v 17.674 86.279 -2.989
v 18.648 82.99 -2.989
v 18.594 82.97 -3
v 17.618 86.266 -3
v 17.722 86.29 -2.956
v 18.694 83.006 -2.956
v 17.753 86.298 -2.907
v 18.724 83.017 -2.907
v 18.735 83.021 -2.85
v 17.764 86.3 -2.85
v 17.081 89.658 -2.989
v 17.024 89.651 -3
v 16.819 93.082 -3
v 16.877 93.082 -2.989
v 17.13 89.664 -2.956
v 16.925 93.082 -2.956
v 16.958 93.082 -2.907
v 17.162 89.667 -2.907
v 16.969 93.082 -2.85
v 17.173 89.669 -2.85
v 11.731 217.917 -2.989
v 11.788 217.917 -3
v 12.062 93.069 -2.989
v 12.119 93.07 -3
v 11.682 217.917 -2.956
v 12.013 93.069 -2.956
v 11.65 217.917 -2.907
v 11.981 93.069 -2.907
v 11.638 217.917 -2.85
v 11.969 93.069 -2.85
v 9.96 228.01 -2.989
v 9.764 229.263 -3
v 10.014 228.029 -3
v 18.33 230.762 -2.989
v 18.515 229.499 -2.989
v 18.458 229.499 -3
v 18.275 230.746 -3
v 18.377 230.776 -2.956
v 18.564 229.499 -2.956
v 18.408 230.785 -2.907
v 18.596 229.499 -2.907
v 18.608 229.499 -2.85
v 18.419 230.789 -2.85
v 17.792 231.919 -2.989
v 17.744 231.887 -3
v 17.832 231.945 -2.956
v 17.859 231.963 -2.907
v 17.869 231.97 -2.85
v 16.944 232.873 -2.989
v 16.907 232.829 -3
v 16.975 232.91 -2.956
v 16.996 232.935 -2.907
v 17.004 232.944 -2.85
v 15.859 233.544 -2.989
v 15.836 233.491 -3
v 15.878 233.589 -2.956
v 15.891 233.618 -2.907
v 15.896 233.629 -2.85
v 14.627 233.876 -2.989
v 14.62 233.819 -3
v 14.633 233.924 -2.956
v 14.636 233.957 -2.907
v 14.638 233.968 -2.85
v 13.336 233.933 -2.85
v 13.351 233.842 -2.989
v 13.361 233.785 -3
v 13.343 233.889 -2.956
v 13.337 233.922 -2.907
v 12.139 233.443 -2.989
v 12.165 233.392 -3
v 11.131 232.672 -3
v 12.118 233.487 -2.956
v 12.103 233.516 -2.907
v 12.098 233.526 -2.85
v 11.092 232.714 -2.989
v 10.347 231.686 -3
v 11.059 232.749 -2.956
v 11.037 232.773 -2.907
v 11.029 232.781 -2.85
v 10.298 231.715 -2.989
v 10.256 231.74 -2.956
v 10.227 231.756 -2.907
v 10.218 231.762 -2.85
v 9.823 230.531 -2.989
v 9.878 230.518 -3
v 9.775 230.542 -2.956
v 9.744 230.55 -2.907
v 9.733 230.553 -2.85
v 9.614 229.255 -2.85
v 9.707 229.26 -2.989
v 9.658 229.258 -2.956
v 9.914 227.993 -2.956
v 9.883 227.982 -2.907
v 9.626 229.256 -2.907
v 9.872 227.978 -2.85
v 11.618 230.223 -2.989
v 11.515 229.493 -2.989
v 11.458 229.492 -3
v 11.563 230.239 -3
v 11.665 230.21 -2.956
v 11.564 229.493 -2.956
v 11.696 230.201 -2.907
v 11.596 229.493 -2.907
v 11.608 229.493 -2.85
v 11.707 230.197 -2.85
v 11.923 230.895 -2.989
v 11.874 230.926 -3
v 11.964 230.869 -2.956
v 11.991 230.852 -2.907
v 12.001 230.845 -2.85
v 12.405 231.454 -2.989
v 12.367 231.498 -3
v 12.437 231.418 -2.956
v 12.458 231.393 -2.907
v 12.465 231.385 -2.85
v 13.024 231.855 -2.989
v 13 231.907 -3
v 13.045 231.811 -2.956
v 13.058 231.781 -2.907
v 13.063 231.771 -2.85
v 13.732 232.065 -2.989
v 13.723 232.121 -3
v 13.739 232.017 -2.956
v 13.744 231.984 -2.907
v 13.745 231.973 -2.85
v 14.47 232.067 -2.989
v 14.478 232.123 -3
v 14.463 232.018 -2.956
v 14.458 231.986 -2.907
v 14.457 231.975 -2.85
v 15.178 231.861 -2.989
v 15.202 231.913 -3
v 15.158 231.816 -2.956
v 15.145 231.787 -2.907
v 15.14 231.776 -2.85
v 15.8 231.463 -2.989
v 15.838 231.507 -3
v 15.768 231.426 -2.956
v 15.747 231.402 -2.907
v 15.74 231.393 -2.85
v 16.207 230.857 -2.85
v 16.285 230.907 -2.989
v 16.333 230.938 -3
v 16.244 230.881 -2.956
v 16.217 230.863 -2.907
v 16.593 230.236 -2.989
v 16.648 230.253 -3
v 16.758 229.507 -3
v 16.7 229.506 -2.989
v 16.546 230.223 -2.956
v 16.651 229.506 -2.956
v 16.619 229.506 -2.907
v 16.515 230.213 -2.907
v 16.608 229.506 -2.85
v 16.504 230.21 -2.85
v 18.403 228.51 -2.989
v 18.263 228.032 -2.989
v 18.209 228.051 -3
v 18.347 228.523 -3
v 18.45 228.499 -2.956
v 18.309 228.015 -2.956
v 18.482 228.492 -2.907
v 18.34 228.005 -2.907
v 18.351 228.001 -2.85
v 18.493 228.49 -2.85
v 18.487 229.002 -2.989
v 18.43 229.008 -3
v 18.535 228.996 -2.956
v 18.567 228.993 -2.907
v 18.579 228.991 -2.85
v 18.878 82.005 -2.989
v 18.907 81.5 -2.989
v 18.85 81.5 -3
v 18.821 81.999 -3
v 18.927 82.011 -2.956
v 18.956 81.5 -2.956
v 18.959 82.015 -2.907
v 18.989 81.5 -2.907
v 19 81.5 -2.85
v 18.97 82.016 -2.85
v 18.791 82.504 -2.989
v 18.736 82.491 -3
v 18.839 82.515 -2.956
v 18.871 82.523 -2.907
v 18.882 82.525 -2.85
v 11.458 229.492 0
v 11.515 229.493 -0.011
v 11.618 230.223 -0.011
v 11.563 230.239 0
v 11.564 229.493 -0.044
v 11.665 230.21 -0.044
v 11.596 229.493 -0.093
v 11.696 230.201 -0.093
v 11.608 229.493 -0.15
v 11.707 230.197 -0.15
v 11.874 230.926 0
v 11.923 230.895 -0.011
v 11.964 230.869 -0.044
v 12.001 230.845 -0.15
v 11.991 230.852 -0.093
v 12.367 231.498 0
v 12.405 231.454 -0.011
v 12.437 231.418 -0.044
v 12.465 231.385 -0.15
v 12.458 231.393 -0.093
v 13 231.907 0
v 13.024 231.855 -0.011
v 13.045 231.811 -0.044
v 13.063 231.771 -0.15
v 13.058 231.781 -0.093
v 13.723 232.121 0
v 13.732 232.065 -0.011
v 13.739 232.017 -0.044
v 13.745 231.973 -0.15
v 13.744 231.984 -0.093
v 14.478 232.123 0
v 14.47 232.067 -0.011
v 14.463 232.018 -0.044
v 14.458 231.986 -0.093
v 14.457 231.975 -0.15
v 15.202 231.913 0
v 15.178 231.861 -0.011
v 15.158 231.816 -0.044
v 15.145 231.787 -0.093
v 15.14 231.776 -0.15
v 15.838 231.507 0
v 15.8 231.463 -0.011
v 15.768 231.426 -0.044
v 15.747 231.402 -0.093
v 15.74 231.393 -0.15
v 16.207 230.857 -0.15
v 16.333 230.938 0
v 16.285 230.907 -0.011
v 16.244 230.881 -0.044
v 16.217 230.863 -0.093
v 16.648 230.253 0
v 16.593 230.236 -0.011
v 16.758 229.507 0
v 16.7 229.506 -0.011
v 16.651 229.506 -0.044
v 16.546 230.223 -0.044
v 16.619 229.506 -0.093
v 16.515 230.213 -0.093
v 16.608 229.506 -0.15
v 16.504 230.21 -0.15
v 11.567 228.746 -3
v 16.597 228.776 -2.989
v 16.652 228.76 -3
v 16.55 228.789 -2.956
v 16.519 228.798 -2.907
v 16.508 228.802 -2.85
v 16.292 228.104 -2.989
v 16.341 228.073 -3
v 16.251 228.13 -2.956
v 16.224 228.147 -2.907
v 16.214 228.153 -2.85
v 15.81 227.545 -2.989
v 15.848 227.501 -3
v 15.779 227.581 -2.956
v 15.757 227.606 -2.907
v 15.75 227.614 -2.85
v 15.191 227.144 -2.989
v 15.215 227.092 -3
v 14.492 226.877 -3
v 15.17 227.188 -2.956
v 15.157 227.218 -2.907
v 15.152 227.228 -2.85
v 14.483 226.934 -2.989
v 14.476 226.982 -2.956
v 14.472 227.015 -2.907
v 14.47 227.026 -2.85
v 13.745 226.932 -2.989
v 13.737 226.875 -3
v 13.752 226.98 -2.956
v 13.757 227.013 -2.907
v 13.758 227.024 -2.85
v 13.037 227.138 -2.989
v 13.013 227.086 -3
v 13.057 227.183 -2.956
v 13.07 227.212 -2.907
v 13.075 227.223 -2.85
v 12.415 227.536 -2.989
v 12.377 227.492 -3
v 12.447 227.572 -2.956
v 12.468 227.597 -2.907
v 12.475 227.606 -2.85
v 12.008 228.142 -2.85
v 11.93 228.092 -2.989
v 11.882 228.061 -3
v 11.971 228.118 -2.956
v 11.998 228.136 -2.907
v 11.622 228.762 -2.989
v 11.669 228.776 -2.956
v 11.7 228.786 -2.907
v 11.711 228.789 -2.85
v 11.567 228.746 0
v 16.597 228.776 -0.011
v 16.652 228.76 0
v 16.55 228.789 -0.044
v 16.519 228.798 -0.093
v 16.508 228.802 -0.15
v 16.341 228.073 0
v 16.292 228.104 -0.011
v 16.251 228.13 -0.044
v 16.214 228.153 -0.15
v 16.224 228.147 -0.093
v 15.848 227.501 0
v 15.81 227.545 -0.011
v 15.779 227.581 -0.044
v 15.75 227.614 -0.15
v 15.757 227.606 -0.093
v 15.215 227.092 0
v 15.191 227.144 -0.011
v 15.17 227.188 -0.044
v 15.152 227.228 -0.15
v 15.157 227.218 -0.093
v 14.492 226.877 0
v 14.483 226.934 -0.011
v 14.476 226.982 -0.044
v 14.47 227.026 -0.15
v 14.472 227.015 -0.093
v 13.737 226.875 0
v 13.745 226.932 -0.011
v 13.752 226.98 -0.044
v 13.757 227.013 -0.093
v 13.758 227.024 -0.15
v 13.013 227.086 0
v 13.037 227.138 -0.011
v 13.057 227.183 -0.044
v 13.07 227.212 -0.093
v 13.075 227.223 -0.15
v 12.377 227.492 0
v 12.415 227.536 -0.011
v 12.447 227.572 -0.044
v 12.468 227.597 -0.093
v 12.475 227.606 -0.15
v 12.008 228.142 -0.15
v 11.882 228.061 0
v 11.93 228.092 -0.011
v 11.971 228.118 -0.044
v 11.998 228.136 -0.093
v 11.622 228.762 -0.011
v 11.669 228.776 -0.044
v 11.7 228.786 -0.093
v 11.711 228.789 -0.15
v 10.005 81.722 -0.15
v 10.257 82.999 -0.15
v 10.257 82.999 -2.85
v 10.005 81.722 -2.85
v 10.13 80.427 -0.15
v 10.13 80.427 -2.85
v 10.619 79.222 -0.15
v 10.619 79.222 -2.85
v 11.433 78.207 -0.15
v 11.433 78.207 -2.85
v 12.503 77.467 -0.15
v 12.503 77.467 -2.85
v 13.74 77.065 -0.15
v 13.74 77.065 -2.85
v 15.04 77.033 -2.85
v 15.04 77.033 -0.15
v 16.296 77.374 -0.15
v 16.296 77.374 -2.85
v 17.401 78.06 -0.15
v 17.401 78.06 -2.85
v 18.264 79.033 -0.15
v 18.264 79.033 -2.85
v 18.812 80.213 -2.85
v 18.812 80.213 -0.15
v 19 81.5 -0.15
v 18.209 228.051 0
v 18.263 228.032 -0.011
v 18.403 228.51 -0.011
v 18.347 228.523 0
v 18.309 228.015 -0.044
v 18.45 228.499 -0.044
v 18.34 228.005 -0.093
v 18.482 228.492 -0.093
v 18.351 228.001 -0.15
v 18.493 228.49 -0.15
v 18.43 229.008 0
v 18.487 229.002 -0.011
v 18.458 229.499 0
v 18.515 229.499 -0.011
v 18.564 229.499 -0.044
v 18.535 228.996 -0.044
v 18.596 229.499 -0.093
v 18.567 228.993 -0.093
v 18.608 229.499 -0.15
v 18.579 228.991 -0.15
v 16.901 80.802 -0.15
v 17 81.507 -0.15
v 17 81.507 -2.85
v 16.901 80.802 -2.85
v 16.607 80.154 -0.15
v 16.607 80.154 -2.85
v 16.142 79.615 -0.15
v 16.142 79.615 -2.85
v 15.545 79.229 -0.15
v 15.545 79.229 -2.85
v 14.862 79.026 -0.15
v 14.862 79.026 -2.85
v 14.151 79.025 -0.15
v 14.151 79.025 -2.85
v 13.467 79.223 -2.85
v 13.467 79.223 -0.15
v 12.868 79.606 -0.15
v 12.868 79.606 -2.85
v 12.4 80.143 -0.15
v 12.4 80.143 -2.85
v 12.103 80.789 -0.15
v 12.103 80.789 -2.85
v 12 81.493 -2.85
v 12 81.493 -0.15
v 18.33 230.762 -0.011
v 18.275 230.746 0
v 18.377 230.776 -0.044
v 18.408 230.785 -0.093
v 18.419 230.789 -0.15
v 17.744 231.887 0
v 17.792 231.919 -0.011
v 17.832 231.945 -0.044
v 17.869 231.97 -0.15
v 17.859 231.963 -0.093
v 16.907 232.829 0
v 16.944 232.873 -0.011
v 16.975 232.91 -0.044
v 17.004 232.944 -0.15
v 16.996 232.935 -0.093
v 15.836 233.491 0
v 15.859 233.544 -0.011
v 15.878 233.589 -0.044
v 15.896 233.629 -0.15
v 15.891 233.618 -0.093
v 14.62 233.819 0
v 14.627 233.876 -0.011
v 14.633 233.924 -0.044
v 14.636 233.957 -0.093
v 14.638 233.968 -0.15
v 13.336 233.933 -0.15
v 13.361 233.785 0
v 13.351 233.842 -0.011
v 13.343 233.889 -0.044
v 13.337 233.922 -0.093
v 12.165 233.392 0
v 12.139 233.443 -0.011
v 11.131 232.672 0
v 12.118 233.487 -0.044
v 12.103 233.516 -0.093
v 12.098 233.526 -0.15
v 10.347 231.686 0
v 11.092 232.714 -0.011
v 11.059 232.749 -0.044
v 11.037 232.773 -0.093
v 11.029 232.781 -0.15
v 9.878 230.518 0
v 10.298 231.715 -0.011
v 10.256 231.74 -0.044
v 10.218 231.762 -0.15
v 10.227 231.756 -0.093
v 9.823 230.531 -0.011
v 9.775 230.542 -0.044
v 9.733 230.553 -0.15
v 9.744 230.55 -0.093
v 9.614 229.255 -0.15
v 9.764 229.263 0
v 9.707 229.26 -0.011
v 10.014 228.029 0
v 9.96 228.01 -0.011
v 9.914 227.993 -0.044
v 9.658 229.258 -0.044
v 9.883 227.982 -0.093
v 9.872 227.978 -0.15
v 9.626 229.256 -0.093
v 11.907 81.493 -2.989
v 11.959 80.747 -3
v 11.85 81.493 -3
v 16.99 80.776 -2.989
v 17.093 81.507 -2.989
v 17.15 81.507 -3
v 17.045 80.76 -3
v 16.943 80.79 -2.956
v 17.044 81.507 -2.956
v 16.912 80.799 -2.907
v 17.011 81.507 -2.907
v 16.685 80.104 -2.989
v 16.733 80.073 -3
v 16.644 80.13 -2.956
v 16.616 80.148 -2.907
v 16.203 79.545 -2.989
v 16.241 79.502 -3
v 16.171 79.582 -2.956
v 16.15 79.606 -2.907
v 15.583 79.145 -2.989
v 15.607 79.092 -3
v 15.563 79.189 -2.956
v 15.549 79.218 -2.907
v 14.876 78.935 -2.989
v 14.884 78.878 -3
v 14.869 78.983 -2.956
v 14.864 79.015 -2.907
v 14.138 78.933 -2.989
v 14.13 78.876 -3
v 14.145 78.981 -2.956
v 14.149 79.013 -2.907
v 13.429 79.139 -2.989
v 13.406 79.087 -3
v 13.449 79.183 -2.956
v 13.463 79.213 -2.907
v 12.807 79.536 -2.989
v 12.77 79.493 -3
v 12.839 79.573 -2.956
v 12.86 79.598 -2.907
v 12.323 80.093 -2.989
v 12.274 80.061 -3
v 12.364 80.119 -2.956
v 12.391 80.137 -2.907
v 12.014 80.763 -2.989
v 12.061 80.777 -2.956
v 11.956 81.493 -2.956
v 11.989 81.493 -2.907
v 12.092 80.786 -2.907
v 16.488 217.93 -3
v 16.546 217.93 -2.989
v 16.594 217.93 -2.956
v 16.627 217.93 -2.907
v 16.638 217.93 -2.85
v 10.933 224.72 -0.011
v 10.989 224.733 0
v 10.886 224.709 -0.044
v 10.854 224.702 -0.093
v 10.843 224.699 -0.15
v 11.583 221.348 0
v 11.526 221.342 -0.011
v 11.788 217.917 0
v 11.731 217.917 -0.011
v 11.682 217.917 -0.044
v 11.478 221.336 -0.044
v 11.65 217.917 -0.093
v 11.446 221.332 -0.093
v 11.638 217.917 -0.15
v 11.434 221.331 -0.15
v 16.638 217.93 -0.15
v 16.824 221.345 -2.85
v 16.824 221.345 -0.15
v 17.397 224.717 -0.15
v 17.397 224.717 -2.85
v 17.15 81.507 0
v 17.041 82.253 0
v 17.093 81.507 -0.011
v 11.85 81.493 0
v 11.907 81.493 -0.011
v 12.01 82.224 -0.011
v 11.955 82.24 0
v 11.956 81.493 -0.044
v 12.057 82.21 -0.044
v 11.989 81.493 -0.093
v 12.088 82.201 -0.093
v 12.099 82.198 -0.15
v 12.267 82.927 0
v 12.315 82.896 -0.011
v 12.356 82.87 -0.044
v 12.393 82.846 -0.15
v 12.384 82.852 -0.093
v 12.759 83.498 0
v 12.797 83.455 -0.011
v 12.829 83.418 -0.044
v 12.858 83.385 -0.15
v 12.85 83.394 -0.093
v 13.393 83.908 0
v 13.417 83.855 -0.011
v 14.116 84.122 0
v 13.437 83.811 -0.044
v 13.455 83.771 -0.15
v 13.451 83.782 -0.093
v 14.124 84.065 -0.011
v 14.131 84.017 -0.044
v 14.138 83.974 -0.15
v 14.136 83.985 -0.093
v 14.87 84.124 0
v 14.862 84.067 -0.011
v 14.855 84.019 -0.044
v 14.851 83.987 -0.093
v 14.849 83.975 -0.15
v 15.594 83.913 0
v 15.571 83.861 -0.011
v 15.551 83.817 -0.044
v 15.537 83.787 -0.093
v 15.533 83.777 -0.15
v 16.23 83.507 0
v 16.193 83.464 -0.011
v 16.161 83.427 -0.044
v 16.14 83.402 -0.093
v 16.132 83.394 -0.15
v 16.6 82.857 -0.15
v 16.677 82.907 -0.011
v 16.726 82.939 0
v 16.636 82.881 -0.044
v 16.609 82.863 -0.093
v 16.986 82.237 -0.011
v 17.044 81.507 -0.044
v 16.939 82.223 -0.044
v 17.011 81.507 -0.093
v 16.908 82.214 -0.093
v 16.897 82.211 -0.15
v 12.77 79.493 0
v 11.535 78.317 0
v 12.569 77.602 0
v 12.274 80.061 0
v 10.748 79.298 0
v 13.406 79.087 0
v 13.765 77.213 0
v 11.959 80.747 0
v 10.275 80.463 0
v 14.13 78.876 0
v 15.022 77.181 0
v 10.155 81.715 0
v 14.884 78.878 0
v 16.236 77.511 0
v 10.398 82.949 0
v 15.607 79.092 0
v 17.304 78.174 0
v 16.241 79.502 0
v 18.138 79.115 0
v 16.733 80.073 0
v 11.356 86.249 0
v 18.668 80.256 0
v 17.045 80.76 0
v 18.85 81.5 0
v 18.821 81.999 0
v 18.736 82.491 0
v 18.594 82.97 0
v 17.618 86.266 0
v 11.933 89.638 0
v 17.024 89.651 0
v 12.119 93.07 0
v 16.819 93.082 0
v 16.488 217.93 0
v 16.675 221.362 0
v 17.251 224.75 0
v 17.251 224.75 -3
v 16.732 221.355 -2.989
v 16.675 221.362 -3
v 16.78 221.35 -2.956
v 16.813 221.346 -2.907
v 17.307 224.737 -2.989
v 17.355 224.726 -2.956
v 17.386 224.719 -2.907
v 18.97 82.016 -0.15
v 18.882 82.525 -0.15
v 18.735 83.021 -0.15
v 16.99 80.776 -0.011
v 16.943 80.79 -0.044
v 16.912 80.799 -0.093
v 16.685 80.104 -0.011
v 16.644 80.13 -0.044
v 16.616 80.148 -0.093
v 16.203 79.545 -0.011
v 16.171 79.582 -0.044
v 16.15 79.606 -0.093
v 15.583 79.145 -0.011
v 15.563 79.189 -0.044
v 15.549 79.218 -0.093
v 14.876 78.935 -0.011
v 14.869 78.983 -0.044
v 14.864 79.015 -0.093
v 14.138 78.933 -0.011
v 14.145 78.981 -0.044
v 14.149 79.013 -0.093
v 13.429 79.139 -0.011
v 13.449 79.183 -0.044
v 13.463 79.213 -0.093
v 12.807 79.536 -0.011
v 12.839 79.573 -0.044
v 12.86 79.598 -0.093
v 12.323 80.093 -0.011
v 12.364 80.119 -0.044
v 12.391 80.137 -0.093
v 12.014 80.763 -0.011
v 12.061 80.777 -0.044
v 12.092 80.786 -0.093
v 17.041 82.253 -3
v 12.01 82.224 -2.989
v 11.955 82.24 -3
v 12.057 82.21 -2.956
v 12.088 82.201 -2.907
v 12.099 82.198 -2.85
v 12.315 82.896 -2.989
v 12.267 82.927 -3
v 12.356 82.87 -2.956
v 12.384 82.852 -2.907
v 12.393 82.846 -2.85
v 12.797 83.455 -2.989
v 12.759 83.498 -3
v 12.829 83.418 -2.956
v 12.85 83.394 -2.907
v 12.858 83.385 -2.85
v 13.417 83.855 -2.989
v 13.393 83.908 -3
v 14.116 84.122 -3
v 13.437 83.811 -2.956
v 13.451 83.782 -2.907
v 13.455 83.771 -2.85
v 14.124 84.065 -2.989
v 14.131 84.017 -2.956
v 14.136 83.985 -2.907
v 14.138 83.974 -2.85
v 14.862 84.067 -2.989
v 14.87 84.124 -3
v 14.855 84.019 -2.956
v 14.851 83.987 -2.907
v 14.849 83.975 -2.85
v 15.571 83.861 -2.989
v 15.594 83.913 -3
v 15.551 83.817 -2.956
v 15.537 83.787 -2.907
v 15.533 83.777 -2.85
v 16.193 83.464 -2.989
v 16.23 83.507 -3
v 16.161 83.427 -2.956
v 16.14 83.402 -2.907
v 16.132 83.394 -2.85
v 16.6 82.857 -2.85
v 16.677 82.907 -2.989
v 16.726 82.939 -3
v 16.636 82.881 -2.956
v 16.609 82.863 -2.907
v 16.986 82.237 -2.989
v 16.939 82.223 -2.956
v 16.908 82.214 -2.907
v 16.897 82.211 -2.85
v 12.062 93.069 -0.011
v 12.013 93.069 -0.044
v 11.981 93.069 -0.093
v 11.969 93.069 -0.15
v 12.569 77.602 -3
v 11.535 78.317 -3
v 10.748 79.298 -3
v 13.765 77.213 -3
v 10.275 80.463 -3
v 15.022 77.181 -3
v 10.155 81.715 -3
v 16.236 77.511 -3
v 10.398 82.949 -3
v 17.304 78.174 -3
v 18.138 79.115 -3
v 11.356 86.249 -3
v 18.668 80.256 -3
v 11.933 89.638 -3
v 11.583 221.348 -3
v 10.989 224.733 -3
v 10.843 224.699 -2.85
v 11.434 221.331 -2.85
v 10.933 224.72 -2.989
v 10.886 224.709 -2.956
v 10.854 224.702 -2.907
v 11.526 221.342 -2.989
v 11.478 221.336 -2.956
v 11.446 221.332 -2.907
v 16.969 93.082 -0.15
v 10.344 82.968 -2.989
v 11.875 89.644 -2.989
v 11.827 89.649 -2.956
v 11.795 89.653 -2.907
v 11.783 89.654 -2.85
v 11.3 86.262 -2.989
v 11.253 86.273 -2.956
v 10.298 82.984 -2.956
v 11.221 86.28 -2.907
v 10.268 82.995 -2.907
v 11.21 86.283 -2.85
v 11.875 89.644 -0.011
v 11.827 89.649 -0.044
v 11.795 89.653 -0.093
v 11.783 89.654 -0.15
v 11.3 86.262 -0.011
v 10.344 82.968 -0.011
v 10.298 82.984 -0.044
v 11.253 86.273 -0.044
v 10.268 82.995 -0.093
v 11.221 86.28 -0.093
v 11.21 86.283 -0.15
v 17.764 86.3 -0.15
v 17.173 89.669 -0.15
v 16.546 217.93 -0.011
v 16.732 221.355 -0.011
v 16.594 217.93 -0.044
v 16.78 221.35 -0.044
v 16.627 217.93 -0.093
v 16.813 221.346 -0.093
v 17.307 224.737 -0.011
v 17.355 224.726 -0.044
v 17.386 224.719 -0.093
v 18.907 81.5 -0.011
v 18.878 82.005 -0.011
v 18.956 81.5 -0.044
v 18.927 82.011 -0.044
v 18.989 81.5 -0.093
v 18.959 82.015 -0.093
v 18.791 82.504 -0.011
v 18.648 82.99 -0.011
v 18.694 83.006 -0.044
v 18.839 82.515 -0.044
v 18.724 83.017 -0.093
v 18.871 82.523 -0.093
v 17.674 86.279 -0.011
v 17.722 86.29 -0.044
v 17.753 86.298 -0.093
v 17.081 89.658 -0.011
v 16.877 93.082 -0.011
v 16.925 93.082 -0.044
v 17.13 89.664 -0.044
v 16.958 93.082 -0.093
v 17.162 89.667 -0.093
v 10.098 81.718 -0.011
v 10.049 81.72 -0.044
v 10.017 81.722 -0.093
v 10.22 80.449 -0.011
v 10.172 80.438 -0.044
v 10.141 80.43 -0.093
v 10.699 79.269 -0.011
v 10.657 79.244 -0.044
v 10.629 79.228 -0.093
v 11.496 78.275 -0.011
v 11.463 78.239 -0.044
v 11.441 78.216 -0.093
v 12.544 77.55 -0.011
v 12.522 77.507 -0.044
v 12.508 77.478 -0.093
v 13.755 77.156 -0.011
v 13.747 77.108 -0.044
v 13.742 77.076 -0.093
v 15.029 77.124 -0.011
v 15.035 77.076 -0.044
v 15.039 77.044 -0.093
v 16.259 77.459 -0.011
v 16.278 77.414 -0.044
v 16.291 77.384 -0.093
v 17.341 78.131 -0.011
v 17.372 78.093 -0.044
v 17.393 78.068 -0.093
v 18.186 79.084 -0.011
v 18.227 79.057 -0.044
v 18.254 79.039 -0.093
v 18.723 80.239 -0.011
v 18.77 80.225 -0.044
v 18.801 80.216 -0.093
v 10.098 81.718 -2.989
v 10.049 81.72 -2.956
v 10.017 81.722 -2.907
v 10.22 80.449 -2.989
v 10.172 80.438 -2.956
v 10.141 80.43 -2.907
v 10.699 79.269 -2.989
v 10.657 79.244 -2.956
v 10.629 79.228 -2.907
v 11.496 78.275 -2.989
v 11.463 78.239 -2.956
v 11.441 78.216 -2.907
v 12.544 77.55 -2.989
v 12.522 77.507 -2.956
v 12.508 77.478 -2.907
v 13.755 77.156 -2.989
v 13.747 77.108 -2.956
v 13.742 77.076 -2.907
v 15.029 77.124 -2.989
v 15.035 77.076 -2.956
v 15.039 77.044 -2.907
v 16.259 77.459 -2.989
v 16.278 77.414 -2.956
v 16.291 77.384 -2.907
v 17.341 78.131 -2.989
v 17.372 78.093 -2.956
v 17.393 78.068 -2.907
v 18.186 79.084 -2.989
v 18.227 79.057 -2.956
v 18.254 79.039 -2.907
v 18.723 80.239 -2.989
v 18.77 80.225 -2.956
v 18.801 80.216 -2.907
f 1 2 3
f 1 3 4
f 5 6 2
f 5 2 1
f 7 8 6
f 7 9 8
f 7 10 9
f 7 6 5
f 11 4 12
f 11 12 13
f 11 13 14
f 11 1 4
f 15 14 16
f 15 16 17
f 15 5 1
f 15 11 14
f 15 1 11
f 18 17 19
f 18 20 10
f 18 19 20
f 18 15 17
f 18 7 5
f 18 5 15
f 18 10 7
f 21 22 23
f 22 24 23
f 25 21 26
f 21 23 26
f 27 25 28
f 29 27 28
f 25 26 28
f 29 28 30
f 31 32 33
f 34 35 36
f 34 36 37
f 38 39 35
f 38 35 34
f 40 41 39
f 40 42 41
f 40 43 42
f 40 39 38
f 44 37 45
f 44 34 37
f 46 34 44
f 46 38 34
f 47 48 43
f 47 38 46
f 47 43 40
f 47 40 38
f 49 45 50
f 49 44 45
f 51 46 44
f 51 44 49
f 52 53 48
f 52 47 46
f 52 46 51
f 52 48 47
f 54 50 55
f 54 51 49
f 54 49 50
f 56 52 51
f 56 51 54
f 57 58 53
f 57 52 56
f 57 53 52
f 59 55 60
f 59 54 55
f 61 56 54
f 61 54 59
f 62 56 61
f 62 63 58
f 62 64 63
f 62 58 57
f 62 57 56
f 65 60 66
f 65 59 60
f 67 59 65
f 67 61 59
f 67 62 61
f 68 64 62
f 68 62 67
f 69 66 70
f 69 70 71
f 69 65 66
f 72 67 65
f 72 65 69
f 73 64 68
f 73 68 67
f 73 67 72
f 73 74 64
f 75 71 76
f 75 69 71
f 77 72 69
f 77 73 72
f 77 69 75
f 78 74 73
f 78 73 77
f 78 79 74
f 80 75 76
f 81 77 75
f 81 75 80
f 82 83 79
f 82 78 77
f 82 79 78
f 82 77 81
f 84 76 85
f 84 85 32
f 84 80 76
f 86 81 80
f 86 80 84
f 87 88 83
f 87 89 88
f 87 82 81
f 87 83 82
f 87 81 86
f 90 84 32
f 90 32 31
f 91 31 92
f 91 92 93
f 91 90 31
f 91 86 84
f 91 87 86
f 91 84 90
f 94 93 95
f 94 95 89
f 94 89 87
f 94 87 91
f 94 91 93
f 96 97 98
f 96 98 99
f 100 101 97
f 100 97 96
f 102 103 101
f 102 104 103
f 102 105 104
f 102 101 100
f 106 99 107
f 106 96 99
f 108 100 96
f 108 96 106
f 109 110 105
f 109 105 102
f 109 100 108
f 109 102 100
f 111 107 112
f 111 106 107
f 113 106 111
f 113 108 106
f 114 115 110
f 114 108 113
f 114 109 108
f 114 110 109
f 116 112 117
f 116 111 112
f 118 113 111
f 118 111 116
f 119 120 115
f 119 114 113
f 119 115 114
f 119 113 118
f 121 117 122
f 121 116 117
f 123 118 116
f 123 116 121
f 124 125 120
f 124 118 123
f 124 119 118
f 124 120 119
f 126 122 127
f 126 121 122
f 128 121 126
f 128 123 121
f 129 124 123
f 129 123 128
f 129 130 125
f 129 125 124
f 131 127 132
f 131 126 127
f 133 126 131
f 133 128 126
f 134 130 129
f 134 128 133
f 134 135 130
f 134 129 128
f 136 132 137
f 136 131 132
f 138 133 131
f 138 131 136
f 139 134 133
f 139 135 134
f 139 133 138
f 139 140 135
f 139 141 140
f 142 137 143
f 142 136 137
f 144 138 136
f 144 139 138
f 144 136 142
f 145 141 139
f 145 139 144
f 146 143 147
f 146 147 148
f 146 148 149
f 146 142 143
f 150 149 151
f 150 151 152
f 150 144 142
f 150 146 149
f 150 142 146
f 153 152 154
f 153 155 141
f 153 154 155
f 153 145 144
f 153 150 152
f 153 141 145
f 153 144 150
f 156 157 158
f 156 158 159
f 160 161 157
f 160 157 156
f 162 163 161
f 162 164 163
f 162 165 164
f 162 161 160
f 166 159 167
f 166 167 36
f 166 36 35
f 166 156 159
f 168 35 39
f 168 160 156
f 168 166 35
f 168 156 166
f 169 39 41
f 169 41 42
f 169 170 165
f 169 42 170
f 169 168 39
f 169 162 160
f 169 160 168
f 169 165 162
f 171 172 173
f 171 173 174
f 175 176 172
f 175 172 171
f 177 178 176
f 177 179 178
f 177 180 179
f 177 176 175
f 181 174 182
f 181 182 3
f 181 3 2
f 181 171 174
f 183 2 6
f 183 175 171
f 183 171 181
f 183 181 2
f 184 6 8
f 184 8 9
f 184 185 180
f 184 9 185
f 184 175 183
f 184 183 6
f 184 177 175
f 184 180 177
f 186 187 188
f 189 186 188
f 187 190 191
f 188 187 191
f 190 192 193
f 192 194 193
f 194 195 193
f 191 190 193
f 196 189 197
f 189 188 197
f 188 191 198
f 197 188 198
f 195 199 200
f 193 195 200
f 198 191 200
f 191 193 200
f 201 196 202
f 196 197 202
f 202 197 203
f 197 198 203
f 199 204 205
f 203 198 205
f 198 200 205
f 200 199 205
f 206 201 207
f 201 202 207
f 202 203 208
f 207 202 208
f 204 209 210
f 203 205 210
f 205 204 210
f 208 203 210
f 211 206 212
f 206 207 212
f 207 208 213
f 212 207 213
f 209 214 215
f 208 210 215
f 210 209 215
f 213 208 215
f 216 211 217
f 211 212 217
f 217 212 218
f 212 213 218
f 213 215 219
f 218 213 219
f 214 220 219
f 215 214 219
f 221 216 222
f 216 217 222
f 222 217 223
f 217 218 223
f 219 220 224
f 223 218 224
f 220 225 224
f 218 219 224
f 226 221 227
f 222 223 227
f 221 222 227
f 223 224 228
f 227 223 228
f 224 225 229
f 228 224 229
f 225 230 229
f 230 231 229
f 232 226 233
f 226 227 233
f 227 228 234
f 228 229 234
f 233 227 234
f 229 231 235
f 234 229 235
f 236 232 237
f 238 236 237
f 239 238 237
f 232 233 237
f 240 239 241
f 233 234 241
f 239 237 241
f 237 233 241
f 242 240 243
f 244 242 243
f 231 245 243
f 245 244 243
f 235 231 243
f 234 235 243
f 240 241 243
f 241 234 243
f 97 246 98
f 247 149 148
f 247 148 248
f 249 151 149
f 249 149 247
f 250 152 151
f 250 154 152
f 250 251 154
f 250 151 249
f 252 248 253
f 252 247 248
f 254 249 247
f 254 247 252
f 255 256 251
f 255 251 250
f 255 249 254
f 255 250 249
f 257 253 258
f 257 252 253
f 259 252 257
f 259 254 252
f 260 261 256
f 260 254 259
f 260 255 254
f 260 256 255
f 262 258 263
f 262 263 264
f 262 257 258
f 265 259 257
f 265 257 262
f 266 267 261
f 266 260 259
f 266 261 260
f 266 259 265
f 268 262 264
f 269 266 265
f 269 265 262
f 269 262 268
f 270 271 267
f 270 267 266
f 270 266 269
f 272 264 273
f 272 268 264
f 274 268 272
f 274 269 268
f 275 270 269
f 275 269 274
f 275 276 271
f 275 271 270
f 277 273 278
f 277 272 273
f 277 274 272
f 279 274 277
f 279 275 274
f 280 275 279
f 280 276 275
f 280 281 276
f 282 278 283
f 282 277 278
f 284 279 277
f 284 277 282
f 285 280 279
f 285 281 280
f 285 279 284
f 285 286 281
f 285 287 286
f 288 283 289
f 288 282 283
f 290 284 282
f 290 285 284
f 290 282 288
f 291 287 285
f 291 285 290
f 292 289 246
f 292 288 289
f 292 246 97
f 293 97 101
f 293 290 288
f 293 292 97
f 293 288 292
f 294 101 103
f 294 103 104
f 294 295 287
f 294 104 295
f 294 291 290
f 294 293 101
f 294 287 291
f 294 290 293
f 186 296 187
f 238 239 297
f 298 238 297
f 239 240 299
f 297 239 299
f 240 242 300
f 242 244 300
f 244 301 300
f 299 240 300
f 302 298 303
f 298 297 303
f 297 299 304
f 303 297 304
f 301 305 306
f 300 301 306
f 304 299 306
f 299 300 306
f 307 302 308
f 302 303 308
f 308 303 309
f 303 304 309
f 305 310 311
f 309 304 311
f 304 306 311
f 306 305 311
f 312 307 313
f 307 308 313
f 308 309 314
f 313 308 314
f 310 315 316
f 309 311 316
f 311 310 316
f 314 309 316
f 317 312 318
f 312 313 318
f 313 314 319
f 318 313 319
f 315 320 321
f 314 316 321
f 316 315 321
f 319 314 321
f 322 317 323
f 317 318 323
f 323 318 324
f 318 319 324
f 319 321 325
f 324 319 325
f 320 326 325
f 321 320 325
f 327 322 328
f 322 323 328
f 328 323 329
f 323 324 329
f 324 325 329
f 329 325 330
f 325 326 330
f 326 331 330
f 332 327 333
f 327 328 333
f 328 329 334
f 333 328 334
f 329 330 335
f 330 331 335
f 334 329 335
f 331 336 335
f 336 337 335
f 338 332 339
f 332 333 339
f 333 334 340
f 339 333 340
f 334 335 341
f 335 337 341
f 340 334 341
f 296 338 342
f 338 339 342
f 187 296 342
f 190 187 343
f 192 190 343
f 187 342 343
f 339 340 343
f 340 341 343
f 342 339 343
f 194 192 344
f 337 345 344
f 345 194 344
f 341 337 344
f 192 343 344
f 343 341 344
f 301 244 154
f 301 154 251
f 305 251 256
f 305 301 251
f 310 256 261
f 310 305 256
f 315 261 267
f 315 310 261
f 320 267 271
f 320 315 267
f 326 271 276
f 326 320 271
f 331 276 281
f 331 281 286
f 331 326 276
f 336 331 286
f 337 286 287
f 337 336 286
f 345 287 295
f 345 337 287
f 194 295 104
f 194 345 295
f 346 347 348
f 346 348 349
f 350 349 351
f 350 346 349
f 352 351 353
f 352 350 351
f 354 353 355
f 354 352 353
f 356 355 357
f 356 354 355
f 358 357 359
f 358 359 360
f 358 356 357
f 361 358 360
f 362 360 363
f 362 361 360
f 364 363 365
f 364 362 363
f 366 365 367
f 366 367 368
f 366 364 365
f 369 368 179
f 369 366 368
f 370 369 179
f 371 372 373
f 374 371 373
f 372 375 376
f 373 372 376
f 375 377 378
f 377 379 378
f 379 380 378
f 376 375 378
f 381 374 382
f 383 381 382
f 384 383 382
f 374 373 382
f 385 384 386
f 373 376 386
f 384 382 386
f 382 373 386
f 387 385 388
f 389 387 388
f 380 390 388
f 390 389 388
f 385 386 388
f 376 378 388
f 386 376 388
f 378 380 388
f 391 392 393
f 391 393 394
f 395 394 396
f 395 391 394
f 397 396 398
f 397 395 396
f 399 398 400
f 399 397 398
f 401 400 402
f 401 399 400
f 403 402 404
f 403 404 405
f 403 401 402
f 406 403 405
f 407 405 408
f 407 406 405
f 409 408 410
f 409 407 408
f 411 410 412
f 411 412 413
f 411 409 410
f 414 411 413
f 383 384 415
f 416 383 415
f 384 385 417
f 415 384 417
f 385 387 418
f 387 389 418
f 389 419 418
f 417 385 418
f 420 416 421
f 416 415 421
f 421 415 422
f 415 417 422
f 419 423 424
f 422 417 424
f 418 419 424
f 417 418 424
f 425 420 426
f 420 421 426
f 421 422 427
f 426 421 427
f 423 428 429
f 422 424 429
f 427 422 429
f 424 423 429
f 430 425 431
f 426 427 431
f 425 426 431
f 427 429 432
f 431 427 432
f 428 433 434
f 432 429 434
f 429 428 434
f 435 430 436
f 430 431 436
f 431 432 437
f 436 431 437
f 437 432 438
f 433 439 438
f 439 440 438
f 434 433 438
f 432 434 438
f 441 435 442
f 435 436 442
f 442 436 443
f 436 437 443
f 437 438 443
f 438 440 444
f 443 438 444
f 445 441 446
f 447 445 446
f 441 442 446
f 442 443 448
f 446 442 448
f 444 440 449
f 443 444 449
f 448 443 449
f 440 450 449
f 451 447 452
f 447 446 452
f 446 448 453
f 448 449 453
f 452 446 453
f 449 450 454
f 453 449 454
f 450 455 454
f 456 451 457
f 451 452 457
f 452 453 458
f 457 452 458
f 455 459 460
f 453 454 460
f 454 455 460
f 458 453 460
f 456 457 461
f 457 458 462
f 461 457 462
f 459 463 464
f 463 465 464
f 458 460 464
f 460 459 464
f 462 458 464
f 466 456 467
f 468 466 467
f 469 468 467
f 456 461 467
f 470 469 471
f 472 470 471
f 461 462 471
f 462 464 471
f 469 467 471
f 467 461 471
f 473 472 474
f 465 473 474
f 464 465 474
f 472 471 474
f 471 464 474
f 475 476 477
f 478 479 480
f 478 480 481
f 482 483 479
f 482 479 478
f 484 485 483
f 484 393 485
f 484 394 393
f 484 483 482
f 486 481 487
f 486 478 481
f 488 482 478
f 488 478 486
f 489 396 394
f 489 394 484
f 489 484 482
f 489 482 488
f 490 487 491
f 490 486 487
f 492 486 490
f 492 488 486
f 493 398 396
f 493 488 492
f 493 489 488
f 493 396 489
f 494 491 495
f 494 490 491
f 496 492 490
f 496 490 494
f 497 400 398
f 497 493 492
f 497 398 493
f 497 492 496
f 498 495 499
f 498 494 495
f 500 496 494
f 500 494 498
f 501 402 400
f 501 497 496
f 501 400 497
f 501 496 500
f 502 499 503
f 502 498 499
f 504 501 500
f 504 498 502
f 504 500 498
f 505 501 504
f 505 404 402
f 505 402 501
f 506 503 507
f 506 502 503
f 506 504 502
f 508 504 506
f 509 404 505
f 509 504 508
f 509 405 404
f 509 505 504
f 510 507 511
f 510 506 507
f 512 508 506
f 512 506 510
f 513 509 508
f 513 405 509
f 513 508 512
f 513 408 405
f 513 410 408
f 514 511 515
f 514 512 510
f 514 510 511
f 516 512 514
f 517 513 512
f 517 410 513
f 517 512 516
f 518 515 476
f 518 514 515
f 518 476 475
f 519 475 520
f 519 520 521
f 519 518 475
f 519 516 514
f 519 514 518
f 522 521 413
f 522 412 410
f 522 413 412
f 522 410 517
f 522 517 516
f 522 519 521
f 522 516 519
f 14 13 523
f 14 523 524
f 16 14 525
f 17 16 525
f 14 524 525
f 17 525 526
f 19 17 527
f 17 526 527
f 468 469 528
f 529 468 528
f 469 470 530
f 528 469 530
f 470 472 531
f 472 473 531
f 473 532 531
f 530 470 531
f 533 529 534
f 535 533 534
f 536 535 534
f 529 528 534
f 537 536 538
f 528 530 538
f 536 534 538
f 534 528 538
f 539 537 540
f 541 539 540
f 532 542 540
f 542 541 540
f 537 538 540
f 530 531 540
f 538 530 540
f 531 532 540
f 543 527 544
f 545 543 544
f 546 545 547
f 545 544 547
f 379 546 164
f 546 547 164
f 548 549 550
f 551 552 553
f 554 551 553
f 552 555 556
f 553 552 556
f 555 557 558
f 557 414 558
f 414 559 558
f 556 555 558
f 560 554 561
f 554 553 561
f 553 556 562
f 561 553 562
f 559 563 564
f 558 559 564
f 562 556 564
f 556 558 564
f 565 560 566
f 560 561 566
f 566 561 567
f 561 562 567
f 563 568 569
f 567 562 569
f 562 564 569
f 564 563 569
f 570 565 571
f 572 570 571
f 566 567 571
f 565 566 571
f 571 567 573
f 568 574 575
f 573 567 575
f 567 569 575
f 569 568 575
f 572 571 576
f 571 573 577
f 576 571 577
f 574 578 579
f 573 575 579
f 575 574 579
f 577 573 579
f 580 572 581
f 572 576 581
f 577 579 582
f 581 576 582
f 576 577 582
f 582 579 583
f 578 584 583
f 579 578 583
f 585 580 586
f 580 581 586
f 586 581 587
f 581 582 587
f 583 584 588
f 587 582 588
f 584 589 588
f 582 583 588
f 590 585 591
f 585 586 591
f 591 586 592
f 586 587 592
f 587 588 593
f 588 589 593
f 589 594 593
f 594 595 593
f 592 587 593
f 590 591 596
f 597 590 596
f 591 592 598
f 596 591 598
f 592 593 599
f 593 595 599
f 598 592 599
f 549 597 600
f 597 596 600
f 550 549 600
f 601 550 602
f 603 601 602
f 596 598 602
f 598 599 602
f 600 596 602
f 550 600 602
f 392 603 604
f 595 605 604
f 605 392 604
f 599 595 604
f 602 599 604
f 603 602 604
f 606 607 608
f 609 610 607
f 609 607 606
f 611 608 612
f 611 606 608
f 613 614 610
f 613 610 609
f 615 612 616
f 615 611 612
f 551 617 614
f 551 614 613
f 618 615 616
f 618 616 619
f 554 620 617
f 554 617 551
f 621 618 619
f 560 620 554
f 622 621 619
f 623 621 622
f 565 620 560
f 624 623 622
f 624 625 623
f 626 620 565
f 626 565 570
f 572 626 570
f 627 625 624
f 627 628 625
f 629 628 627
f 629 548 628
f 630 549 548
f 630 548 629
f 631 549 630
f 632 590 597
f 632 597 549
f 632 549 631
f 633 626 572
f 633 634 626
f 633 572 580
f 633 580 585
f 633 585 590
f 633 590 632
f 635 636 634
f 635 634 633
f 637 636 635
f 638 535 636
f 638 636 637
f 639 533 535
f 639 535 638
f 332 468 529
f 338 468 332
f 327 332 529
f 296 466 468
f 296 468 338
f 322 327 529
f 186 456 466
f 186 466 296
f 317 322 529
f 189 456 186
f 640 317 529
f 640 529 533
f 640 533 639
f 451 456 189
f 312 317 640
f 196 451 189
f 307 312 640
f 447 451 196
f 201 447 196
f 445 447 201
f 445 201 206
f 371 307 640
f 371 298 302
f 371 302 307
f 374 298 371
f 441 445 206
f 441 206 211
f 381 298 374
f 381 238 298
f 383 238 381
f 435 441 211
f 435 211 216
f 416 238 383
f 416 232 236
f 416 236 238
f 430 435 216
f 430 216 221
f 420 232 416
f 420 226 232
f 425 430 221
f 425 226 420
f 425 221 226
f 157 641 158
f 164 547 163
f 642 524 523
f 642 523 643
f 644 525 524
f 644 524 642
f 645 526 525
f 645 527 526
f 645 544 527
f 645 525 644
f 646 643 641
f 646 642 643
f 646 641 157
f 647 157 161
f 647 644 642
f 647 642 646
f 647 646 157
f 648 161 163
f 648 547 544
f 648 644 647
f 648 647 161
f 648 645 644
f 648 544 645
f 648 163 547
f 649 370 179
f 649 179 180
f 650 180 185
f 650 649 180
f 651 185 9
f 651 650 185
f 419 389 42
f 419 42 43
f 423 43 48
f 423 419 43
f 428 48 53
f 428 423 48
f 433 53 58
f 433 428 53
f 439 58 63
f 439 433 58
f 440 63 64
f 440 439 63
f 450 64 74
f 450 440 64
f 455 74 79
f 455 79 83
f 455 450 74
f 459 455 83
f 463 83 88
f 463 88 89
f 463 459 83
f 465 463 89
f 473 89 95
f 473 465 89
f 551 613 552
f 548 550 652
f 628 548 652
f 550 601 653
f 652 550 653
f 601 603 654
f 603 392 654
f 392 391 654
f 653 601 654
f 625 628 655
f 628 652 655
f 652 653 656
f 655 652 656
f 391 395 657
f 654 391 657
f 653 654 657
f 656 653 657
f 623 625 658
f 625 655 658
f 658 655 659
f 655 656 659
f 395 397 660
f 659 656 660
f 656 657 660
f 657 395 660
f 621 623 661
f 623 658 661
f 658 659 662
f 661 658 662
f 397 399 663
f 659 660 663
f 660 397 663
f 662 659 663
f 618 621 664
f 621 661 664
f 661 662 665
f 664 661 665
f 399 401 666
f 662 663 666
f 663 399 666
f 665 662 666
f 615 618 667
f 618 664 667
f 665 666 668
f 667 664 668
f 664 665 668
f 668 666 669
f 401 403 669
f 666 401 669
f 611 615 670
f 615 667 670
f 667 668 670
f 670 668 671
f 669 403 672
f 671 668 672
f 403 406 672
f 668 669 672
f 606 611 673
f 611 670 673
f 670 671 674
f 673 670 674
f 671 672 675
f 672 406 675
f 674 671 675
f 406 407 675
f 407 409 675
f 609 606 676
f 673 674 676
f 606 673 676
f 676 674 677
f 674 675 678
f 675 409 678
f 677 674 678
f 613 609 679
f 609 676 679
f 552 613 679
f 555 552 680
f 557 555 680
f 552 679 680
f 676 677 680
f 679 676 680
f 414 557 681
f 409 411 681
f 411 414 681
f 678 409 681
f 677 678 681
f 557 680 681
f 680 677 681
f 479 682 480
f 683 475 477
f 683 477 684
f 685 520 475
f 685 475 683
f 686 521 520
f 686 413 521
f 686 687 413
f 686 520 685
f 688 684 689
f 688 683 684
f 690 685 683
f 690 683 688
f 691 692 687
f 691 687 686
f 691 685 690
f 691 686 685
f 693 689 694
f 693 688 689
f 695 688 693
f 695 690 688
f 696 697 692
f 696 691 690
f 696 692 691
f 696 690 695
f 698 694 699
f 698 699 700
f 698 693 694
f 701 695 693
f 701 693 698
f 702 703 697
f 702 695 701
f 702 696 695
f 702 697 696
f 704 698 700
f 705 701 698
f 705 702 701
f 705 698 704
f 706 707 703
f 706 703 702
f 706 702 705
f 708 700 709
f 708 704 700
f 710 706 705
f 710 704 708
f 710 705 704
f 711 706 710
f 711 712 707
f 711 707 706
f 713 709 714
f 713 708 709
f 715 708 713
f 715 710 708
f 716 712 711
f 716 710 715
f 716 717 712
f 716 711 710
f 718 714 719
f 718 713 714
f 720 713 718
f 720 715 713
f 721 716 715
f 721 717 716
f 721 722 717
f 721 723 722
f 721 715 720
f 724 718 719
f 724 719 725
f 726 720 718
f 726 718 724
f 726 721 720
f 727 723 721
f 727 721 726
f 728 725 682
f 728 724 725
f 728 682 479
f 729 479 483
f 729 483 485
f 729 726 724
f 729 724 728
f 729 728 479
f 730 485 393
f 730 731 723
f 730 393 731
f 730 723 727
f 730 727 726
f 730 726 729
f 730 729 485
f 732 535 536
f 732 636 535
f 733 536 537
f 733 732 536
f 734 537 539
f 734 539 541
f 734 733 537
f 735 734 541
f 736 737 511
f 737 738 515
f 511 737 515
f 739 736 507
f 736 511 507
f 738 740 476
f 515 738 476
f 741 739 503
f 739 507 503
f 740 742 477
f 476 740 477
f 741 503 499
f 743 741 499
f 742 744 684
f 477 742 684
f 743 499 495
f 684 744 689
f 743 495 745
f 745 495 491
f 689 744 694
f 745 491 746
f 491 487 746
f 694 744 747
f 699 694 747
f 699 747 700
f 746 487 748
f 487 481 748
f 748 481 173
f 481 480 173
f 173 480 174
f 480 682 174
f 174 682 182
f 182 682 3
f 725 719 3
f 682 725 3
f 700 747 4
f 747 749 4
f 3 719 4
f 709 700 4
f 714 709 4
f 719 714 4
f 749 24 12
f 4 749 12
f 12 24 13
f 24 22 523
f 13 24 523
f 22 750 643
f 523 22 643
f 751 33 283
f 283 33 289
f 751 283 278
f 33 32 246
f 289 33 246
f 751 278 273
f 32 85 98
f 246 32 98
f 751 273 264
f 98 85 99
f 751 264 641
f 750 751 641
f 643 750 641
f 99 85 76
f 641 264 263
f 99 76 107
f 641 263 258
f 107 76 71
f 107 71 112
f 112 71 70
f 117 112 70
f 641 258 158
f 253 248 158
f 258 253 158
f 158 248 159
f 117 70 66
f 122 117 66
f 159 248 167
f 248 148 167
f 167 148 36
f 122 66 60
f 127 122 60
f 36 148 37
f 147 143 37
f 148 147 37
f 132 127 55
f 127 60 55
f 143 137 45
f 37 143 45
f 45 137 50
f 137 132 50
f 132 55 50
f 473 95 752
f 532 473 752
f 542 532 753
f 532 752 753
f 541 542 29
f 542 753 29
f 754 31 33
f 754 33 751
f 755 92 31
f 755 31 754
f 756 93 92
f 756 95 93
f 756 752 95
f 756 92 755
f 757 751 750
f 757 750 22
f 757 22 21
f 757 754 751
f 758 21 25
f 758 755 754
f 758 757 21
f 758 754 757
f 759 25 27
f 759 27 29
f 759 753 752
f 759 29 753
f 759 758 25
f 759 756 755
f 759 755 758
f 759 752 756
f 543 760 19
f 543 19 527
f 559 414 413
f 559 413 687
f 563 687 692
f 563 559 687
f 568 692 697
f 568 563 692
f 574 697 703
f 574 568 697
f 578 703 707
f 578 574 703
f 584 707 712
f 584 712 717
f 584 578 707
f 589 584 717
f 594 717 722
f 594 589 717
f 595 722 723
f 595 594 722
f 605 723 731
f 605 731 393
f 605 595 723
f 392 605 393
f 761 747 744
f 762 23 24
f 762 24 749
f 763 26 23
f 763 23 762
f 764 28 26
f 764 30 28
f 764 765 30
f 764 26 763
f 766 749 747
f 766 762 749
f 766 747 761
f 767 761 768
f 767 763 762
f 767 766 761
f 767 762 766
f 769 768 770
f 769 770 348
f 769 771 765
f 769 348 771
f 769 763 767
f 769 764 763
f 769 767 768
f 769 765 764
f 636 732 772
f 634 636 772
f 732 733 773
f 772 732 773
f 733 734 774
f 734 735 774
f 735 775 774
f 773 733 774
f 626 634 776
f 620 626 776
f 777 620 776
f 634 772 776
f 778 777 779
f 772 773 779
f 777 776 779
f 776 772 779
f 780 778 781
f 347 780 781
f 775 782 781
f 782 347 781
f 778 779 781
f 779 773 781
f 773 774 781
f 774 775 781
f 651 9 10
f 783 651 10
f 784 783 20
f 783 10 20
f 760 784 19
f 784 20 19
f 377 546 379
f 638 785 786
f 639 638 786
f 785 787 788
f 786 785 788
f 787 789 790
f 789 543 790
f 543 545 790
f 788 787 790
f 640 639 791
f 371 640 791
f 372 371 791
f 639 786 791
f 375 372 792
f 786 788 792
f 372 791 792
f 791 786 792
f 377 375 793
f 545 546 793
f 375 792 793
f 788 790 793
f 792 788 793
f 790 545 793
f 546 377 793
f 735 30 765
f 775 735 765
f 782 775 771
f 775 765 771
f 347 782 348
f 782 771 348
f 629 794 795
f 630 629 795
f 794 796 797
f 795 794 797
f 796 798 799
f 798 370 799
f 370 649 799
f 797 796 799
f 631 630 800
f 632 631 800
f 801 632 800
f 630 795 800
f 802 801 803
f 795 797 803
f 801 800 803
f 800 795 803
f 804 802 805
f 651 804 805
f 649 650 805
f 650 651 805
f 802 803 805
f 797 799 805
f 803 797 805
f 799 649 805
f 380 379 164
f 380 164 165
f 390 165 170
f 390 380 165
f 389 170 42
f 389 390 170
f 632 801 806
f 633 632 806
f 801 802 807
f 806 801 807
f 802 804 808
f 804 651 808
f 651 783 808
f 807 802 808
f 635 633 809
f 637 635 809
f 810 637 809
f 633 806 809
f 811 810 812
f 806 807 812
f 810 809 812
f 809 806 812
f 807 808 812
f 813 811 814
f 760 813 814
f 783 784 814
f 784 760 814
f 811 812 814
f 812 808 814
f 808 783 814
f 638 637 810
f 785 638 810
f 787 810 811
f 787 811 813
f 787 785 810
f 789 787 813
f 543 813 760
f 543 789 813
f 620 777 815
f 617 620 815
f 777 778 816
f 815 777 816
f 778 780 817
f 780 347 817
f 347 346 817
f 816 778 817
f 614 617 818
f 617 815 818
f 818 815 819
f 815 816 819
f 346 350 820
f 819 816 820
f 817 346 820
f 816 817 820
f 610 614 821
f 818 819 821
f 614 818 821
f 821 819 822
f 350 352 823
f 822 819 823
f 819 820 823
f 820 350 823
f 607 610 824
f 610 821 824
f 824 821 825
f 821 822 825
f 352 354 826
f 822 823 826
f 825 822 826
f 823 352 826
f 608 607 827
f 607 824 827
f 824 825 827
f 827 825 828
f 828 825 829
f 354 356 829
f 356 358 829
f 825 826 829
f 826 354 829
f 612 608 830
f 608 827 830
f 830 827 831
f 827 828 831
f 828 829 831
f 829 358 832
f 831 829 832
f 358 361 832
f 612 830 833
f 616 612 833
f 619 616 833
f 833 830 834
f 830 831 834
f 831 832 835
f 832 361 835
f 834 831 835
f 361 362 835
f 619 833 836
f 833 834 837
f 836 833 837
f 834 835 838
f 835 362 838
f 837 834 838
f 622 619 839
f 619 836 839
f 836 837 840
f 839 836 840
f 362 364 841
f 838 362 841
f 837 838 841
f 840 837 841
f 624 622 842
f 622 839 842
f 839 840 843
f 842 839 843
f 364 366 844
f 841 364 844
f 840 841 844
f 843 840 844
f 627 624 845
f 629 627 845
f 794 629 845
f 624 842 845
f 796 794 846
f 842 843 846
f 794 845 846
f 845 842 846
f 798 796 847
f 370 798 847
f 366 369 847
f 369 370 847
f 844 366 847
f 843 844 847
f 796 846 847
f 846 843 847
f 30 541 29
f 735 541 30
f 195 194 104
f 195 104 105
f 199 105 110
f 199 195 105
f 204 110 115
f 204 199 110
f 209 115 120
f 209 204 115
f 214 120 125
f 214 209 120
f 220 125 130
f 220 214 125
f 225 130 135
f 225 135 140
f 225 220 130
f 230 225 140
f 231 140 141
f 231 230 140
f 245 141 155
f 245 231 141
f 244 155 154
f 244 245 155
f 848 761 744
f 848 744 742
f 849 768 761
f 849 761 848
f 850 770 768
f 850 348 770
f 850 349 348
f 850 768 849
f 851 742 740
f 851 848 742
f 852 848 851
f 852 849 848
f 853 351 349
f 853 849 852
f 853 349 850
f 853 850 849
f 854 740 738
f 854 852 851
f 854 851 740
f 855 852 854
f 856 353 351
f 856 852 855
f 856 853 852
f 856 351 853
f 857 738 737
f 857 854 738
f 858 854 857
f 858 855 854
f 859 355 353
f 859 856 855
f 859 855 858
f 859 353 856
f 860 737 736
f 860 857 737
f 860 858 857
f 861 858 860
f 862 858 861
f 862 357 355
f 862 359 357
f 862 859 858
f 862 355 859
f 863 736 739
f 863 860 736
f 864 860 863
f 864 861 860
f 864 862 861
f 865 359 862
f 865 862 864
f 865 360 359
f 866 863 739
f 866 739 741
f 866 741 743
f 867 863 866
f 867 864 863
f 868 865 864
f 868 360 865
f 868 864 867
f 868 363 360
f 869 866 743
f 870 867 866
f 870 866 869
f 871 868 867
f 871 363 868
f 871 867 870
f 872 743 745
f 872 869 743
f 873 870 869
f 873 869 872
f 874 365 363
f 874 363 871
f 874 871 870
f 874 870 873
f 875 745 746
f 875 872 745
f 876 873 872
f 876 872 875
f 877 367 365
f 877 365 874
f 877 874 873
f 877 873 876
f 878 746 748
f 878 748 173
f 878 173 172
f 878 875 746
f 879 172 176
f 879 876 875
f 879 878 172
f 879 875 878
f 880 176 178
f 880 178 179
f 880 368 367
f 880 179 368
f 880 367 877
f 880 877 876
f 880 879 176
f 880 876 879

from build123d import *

# Parameters (mm, degrees)
BOSS_EXTRUDE1_DEPTH = 3
FILLET1_R           = 30
FILLET2_R           = 0.15


with BuildPart() as part:
    # Sketch1 → Boss-Extrude1 (new body)
    with BuildSketch(Plane.XY):
        with BuildLine():
            ThreePointArc((18.60751735, 229.499479574), (11.980936647, 233.465290274), (11.617448679, 225.75120557))
            Line((11.617448679, 225.75120557), (11.607526141, 229.4928498))
            ThreePointArc((11.607526141, 229.4928498), (14.100887576, 231.999470783), (16.60750856, 229.506109348))
            Line((16.60750856, 229.506109348), (16.617431097, 225.764465118))
            ThreePointArc((16.617431097, 225.764465118), (18.078953606, 227.38342332), (18.60751735, 229.499479574))
        make_face()
        with BuildLine():
            Line((11.617448679, 225.75120557), (11.990086237, 85.235014445))
            ThreePointArc((11.990086237, 85.235014445), (14.48806639, 85.999984166), (16.990068655, 85.248273993))
            Line((16.990068655, 85.248273993), (16.617431097, 225.764465118))
            ThreePointArc((16.617431097, 225.764465118), (14.119450944, 224.999495398), (11.617448679, 225.75120557))
        make_face()
        with BuildLine():
            Line((11.607526141, 229.4928498), (11.617448679, 225.75120557))
            ThreePointArc((11.617448679, 225.75120557), (14.119450944, 224.999495398), (16.617431097, 225.764465118))
            Line((16.617431097, 225.764465118), (16.60750856, 229.506109348))
            ThreePointArc((16.60750856, 229.506109348), (14.114147125, 226.999488365), (11.607526141, 229.4928498))
        make_face()
        with BuildLine():
            Line((11.990086237, 85.235014445), (12.000008774, 81.493370215))
            ThreePointArc((12.000008774, 81.493370215), (14.493370209, 83.999991198), (16.999991193, 81.506629763))
            Line((16.999991193, 81.506629763), (16.990068655, 85.248273993))
            ThreePointArc((16.990068655, 85.248273993), (14.48806639, 85.999984166), (11.990086237, 85.235014445))
        make_face()
        with BuildLine():
            ThreePointArc((16.999991193, 81.506629763), (14.506629758, 79.00000878), (12.000008774, 81.493370215))
            Line((12.000008774, 81.493370215), (11.990086237, 85.235014445))
            ThreePointArc((11.990086237, 85.235014445), (12.383943729, 77.528563734), (18.999999983, 81.499999989))
            ThreePointArc((18.999999983, 81.499999989), (18.465810684, 83.626580693), (16.990068655, 85.248273993))
            Line((16.990068655, 85.248273993), (16.999991193, 81.506629763))
        make_face()
    extrude(amount=-BOSS_EXTRUDE1_DEPTH)

    # Fillet1
    fillet1_edges = [part.edges().sort_by_distance(p)[0] for p in [
        (11.617448679, 225.75120557, -1.5),
        (16.617431097, 225.764465118, -1.5),
        (16.990068655, 85.248273993, -1.5),
        (11.990086237, 85.235014445, -1.5),
    ]]
    fillet(fillet1_edges, radius=FILLET1_R)

    # Fillet2
    fillet2_edges = [part.edges().sort_by_distance(p)[0] for p in [
        (13.73974947, 77.064684988, 0),
        (11.607526141, 229.4928498, -3),
        (13.73974947, 77.064684988, -3),
        (16.803749876, 155.506369556, 0),
        (16.803749876, 155.506369556, -3),
        (11.803767458, 155.493110007, 0),
        (11.803767458, 155.493110007, -3),
        (16.999991193, 81.506629763, -3),
        (14.095583757, 233.999463751, 0),
        (14.095583757, 233.999463751, -3),
        (17.420816024, 87.97606622, 0),
        (17.420816024, 87.97606622, -3),
        (11.54487726, 87.960483706, 0),
        (11.54487726, 87.960483706, -3),
        (11.18670131, 223.023413344, 0),
        (11.18670131, 223.023413344, -3),
        (17.062640073, 223.038995857, 0),
        (17.062640073, 223.038995857, -3),
        (16.999991193, 81.506629763, 0),
        (11.607526141, 229.4928498, 0),
    ]]
    fillet(fillet2_edges, radius=FILLET2_R)


solid = part.part
